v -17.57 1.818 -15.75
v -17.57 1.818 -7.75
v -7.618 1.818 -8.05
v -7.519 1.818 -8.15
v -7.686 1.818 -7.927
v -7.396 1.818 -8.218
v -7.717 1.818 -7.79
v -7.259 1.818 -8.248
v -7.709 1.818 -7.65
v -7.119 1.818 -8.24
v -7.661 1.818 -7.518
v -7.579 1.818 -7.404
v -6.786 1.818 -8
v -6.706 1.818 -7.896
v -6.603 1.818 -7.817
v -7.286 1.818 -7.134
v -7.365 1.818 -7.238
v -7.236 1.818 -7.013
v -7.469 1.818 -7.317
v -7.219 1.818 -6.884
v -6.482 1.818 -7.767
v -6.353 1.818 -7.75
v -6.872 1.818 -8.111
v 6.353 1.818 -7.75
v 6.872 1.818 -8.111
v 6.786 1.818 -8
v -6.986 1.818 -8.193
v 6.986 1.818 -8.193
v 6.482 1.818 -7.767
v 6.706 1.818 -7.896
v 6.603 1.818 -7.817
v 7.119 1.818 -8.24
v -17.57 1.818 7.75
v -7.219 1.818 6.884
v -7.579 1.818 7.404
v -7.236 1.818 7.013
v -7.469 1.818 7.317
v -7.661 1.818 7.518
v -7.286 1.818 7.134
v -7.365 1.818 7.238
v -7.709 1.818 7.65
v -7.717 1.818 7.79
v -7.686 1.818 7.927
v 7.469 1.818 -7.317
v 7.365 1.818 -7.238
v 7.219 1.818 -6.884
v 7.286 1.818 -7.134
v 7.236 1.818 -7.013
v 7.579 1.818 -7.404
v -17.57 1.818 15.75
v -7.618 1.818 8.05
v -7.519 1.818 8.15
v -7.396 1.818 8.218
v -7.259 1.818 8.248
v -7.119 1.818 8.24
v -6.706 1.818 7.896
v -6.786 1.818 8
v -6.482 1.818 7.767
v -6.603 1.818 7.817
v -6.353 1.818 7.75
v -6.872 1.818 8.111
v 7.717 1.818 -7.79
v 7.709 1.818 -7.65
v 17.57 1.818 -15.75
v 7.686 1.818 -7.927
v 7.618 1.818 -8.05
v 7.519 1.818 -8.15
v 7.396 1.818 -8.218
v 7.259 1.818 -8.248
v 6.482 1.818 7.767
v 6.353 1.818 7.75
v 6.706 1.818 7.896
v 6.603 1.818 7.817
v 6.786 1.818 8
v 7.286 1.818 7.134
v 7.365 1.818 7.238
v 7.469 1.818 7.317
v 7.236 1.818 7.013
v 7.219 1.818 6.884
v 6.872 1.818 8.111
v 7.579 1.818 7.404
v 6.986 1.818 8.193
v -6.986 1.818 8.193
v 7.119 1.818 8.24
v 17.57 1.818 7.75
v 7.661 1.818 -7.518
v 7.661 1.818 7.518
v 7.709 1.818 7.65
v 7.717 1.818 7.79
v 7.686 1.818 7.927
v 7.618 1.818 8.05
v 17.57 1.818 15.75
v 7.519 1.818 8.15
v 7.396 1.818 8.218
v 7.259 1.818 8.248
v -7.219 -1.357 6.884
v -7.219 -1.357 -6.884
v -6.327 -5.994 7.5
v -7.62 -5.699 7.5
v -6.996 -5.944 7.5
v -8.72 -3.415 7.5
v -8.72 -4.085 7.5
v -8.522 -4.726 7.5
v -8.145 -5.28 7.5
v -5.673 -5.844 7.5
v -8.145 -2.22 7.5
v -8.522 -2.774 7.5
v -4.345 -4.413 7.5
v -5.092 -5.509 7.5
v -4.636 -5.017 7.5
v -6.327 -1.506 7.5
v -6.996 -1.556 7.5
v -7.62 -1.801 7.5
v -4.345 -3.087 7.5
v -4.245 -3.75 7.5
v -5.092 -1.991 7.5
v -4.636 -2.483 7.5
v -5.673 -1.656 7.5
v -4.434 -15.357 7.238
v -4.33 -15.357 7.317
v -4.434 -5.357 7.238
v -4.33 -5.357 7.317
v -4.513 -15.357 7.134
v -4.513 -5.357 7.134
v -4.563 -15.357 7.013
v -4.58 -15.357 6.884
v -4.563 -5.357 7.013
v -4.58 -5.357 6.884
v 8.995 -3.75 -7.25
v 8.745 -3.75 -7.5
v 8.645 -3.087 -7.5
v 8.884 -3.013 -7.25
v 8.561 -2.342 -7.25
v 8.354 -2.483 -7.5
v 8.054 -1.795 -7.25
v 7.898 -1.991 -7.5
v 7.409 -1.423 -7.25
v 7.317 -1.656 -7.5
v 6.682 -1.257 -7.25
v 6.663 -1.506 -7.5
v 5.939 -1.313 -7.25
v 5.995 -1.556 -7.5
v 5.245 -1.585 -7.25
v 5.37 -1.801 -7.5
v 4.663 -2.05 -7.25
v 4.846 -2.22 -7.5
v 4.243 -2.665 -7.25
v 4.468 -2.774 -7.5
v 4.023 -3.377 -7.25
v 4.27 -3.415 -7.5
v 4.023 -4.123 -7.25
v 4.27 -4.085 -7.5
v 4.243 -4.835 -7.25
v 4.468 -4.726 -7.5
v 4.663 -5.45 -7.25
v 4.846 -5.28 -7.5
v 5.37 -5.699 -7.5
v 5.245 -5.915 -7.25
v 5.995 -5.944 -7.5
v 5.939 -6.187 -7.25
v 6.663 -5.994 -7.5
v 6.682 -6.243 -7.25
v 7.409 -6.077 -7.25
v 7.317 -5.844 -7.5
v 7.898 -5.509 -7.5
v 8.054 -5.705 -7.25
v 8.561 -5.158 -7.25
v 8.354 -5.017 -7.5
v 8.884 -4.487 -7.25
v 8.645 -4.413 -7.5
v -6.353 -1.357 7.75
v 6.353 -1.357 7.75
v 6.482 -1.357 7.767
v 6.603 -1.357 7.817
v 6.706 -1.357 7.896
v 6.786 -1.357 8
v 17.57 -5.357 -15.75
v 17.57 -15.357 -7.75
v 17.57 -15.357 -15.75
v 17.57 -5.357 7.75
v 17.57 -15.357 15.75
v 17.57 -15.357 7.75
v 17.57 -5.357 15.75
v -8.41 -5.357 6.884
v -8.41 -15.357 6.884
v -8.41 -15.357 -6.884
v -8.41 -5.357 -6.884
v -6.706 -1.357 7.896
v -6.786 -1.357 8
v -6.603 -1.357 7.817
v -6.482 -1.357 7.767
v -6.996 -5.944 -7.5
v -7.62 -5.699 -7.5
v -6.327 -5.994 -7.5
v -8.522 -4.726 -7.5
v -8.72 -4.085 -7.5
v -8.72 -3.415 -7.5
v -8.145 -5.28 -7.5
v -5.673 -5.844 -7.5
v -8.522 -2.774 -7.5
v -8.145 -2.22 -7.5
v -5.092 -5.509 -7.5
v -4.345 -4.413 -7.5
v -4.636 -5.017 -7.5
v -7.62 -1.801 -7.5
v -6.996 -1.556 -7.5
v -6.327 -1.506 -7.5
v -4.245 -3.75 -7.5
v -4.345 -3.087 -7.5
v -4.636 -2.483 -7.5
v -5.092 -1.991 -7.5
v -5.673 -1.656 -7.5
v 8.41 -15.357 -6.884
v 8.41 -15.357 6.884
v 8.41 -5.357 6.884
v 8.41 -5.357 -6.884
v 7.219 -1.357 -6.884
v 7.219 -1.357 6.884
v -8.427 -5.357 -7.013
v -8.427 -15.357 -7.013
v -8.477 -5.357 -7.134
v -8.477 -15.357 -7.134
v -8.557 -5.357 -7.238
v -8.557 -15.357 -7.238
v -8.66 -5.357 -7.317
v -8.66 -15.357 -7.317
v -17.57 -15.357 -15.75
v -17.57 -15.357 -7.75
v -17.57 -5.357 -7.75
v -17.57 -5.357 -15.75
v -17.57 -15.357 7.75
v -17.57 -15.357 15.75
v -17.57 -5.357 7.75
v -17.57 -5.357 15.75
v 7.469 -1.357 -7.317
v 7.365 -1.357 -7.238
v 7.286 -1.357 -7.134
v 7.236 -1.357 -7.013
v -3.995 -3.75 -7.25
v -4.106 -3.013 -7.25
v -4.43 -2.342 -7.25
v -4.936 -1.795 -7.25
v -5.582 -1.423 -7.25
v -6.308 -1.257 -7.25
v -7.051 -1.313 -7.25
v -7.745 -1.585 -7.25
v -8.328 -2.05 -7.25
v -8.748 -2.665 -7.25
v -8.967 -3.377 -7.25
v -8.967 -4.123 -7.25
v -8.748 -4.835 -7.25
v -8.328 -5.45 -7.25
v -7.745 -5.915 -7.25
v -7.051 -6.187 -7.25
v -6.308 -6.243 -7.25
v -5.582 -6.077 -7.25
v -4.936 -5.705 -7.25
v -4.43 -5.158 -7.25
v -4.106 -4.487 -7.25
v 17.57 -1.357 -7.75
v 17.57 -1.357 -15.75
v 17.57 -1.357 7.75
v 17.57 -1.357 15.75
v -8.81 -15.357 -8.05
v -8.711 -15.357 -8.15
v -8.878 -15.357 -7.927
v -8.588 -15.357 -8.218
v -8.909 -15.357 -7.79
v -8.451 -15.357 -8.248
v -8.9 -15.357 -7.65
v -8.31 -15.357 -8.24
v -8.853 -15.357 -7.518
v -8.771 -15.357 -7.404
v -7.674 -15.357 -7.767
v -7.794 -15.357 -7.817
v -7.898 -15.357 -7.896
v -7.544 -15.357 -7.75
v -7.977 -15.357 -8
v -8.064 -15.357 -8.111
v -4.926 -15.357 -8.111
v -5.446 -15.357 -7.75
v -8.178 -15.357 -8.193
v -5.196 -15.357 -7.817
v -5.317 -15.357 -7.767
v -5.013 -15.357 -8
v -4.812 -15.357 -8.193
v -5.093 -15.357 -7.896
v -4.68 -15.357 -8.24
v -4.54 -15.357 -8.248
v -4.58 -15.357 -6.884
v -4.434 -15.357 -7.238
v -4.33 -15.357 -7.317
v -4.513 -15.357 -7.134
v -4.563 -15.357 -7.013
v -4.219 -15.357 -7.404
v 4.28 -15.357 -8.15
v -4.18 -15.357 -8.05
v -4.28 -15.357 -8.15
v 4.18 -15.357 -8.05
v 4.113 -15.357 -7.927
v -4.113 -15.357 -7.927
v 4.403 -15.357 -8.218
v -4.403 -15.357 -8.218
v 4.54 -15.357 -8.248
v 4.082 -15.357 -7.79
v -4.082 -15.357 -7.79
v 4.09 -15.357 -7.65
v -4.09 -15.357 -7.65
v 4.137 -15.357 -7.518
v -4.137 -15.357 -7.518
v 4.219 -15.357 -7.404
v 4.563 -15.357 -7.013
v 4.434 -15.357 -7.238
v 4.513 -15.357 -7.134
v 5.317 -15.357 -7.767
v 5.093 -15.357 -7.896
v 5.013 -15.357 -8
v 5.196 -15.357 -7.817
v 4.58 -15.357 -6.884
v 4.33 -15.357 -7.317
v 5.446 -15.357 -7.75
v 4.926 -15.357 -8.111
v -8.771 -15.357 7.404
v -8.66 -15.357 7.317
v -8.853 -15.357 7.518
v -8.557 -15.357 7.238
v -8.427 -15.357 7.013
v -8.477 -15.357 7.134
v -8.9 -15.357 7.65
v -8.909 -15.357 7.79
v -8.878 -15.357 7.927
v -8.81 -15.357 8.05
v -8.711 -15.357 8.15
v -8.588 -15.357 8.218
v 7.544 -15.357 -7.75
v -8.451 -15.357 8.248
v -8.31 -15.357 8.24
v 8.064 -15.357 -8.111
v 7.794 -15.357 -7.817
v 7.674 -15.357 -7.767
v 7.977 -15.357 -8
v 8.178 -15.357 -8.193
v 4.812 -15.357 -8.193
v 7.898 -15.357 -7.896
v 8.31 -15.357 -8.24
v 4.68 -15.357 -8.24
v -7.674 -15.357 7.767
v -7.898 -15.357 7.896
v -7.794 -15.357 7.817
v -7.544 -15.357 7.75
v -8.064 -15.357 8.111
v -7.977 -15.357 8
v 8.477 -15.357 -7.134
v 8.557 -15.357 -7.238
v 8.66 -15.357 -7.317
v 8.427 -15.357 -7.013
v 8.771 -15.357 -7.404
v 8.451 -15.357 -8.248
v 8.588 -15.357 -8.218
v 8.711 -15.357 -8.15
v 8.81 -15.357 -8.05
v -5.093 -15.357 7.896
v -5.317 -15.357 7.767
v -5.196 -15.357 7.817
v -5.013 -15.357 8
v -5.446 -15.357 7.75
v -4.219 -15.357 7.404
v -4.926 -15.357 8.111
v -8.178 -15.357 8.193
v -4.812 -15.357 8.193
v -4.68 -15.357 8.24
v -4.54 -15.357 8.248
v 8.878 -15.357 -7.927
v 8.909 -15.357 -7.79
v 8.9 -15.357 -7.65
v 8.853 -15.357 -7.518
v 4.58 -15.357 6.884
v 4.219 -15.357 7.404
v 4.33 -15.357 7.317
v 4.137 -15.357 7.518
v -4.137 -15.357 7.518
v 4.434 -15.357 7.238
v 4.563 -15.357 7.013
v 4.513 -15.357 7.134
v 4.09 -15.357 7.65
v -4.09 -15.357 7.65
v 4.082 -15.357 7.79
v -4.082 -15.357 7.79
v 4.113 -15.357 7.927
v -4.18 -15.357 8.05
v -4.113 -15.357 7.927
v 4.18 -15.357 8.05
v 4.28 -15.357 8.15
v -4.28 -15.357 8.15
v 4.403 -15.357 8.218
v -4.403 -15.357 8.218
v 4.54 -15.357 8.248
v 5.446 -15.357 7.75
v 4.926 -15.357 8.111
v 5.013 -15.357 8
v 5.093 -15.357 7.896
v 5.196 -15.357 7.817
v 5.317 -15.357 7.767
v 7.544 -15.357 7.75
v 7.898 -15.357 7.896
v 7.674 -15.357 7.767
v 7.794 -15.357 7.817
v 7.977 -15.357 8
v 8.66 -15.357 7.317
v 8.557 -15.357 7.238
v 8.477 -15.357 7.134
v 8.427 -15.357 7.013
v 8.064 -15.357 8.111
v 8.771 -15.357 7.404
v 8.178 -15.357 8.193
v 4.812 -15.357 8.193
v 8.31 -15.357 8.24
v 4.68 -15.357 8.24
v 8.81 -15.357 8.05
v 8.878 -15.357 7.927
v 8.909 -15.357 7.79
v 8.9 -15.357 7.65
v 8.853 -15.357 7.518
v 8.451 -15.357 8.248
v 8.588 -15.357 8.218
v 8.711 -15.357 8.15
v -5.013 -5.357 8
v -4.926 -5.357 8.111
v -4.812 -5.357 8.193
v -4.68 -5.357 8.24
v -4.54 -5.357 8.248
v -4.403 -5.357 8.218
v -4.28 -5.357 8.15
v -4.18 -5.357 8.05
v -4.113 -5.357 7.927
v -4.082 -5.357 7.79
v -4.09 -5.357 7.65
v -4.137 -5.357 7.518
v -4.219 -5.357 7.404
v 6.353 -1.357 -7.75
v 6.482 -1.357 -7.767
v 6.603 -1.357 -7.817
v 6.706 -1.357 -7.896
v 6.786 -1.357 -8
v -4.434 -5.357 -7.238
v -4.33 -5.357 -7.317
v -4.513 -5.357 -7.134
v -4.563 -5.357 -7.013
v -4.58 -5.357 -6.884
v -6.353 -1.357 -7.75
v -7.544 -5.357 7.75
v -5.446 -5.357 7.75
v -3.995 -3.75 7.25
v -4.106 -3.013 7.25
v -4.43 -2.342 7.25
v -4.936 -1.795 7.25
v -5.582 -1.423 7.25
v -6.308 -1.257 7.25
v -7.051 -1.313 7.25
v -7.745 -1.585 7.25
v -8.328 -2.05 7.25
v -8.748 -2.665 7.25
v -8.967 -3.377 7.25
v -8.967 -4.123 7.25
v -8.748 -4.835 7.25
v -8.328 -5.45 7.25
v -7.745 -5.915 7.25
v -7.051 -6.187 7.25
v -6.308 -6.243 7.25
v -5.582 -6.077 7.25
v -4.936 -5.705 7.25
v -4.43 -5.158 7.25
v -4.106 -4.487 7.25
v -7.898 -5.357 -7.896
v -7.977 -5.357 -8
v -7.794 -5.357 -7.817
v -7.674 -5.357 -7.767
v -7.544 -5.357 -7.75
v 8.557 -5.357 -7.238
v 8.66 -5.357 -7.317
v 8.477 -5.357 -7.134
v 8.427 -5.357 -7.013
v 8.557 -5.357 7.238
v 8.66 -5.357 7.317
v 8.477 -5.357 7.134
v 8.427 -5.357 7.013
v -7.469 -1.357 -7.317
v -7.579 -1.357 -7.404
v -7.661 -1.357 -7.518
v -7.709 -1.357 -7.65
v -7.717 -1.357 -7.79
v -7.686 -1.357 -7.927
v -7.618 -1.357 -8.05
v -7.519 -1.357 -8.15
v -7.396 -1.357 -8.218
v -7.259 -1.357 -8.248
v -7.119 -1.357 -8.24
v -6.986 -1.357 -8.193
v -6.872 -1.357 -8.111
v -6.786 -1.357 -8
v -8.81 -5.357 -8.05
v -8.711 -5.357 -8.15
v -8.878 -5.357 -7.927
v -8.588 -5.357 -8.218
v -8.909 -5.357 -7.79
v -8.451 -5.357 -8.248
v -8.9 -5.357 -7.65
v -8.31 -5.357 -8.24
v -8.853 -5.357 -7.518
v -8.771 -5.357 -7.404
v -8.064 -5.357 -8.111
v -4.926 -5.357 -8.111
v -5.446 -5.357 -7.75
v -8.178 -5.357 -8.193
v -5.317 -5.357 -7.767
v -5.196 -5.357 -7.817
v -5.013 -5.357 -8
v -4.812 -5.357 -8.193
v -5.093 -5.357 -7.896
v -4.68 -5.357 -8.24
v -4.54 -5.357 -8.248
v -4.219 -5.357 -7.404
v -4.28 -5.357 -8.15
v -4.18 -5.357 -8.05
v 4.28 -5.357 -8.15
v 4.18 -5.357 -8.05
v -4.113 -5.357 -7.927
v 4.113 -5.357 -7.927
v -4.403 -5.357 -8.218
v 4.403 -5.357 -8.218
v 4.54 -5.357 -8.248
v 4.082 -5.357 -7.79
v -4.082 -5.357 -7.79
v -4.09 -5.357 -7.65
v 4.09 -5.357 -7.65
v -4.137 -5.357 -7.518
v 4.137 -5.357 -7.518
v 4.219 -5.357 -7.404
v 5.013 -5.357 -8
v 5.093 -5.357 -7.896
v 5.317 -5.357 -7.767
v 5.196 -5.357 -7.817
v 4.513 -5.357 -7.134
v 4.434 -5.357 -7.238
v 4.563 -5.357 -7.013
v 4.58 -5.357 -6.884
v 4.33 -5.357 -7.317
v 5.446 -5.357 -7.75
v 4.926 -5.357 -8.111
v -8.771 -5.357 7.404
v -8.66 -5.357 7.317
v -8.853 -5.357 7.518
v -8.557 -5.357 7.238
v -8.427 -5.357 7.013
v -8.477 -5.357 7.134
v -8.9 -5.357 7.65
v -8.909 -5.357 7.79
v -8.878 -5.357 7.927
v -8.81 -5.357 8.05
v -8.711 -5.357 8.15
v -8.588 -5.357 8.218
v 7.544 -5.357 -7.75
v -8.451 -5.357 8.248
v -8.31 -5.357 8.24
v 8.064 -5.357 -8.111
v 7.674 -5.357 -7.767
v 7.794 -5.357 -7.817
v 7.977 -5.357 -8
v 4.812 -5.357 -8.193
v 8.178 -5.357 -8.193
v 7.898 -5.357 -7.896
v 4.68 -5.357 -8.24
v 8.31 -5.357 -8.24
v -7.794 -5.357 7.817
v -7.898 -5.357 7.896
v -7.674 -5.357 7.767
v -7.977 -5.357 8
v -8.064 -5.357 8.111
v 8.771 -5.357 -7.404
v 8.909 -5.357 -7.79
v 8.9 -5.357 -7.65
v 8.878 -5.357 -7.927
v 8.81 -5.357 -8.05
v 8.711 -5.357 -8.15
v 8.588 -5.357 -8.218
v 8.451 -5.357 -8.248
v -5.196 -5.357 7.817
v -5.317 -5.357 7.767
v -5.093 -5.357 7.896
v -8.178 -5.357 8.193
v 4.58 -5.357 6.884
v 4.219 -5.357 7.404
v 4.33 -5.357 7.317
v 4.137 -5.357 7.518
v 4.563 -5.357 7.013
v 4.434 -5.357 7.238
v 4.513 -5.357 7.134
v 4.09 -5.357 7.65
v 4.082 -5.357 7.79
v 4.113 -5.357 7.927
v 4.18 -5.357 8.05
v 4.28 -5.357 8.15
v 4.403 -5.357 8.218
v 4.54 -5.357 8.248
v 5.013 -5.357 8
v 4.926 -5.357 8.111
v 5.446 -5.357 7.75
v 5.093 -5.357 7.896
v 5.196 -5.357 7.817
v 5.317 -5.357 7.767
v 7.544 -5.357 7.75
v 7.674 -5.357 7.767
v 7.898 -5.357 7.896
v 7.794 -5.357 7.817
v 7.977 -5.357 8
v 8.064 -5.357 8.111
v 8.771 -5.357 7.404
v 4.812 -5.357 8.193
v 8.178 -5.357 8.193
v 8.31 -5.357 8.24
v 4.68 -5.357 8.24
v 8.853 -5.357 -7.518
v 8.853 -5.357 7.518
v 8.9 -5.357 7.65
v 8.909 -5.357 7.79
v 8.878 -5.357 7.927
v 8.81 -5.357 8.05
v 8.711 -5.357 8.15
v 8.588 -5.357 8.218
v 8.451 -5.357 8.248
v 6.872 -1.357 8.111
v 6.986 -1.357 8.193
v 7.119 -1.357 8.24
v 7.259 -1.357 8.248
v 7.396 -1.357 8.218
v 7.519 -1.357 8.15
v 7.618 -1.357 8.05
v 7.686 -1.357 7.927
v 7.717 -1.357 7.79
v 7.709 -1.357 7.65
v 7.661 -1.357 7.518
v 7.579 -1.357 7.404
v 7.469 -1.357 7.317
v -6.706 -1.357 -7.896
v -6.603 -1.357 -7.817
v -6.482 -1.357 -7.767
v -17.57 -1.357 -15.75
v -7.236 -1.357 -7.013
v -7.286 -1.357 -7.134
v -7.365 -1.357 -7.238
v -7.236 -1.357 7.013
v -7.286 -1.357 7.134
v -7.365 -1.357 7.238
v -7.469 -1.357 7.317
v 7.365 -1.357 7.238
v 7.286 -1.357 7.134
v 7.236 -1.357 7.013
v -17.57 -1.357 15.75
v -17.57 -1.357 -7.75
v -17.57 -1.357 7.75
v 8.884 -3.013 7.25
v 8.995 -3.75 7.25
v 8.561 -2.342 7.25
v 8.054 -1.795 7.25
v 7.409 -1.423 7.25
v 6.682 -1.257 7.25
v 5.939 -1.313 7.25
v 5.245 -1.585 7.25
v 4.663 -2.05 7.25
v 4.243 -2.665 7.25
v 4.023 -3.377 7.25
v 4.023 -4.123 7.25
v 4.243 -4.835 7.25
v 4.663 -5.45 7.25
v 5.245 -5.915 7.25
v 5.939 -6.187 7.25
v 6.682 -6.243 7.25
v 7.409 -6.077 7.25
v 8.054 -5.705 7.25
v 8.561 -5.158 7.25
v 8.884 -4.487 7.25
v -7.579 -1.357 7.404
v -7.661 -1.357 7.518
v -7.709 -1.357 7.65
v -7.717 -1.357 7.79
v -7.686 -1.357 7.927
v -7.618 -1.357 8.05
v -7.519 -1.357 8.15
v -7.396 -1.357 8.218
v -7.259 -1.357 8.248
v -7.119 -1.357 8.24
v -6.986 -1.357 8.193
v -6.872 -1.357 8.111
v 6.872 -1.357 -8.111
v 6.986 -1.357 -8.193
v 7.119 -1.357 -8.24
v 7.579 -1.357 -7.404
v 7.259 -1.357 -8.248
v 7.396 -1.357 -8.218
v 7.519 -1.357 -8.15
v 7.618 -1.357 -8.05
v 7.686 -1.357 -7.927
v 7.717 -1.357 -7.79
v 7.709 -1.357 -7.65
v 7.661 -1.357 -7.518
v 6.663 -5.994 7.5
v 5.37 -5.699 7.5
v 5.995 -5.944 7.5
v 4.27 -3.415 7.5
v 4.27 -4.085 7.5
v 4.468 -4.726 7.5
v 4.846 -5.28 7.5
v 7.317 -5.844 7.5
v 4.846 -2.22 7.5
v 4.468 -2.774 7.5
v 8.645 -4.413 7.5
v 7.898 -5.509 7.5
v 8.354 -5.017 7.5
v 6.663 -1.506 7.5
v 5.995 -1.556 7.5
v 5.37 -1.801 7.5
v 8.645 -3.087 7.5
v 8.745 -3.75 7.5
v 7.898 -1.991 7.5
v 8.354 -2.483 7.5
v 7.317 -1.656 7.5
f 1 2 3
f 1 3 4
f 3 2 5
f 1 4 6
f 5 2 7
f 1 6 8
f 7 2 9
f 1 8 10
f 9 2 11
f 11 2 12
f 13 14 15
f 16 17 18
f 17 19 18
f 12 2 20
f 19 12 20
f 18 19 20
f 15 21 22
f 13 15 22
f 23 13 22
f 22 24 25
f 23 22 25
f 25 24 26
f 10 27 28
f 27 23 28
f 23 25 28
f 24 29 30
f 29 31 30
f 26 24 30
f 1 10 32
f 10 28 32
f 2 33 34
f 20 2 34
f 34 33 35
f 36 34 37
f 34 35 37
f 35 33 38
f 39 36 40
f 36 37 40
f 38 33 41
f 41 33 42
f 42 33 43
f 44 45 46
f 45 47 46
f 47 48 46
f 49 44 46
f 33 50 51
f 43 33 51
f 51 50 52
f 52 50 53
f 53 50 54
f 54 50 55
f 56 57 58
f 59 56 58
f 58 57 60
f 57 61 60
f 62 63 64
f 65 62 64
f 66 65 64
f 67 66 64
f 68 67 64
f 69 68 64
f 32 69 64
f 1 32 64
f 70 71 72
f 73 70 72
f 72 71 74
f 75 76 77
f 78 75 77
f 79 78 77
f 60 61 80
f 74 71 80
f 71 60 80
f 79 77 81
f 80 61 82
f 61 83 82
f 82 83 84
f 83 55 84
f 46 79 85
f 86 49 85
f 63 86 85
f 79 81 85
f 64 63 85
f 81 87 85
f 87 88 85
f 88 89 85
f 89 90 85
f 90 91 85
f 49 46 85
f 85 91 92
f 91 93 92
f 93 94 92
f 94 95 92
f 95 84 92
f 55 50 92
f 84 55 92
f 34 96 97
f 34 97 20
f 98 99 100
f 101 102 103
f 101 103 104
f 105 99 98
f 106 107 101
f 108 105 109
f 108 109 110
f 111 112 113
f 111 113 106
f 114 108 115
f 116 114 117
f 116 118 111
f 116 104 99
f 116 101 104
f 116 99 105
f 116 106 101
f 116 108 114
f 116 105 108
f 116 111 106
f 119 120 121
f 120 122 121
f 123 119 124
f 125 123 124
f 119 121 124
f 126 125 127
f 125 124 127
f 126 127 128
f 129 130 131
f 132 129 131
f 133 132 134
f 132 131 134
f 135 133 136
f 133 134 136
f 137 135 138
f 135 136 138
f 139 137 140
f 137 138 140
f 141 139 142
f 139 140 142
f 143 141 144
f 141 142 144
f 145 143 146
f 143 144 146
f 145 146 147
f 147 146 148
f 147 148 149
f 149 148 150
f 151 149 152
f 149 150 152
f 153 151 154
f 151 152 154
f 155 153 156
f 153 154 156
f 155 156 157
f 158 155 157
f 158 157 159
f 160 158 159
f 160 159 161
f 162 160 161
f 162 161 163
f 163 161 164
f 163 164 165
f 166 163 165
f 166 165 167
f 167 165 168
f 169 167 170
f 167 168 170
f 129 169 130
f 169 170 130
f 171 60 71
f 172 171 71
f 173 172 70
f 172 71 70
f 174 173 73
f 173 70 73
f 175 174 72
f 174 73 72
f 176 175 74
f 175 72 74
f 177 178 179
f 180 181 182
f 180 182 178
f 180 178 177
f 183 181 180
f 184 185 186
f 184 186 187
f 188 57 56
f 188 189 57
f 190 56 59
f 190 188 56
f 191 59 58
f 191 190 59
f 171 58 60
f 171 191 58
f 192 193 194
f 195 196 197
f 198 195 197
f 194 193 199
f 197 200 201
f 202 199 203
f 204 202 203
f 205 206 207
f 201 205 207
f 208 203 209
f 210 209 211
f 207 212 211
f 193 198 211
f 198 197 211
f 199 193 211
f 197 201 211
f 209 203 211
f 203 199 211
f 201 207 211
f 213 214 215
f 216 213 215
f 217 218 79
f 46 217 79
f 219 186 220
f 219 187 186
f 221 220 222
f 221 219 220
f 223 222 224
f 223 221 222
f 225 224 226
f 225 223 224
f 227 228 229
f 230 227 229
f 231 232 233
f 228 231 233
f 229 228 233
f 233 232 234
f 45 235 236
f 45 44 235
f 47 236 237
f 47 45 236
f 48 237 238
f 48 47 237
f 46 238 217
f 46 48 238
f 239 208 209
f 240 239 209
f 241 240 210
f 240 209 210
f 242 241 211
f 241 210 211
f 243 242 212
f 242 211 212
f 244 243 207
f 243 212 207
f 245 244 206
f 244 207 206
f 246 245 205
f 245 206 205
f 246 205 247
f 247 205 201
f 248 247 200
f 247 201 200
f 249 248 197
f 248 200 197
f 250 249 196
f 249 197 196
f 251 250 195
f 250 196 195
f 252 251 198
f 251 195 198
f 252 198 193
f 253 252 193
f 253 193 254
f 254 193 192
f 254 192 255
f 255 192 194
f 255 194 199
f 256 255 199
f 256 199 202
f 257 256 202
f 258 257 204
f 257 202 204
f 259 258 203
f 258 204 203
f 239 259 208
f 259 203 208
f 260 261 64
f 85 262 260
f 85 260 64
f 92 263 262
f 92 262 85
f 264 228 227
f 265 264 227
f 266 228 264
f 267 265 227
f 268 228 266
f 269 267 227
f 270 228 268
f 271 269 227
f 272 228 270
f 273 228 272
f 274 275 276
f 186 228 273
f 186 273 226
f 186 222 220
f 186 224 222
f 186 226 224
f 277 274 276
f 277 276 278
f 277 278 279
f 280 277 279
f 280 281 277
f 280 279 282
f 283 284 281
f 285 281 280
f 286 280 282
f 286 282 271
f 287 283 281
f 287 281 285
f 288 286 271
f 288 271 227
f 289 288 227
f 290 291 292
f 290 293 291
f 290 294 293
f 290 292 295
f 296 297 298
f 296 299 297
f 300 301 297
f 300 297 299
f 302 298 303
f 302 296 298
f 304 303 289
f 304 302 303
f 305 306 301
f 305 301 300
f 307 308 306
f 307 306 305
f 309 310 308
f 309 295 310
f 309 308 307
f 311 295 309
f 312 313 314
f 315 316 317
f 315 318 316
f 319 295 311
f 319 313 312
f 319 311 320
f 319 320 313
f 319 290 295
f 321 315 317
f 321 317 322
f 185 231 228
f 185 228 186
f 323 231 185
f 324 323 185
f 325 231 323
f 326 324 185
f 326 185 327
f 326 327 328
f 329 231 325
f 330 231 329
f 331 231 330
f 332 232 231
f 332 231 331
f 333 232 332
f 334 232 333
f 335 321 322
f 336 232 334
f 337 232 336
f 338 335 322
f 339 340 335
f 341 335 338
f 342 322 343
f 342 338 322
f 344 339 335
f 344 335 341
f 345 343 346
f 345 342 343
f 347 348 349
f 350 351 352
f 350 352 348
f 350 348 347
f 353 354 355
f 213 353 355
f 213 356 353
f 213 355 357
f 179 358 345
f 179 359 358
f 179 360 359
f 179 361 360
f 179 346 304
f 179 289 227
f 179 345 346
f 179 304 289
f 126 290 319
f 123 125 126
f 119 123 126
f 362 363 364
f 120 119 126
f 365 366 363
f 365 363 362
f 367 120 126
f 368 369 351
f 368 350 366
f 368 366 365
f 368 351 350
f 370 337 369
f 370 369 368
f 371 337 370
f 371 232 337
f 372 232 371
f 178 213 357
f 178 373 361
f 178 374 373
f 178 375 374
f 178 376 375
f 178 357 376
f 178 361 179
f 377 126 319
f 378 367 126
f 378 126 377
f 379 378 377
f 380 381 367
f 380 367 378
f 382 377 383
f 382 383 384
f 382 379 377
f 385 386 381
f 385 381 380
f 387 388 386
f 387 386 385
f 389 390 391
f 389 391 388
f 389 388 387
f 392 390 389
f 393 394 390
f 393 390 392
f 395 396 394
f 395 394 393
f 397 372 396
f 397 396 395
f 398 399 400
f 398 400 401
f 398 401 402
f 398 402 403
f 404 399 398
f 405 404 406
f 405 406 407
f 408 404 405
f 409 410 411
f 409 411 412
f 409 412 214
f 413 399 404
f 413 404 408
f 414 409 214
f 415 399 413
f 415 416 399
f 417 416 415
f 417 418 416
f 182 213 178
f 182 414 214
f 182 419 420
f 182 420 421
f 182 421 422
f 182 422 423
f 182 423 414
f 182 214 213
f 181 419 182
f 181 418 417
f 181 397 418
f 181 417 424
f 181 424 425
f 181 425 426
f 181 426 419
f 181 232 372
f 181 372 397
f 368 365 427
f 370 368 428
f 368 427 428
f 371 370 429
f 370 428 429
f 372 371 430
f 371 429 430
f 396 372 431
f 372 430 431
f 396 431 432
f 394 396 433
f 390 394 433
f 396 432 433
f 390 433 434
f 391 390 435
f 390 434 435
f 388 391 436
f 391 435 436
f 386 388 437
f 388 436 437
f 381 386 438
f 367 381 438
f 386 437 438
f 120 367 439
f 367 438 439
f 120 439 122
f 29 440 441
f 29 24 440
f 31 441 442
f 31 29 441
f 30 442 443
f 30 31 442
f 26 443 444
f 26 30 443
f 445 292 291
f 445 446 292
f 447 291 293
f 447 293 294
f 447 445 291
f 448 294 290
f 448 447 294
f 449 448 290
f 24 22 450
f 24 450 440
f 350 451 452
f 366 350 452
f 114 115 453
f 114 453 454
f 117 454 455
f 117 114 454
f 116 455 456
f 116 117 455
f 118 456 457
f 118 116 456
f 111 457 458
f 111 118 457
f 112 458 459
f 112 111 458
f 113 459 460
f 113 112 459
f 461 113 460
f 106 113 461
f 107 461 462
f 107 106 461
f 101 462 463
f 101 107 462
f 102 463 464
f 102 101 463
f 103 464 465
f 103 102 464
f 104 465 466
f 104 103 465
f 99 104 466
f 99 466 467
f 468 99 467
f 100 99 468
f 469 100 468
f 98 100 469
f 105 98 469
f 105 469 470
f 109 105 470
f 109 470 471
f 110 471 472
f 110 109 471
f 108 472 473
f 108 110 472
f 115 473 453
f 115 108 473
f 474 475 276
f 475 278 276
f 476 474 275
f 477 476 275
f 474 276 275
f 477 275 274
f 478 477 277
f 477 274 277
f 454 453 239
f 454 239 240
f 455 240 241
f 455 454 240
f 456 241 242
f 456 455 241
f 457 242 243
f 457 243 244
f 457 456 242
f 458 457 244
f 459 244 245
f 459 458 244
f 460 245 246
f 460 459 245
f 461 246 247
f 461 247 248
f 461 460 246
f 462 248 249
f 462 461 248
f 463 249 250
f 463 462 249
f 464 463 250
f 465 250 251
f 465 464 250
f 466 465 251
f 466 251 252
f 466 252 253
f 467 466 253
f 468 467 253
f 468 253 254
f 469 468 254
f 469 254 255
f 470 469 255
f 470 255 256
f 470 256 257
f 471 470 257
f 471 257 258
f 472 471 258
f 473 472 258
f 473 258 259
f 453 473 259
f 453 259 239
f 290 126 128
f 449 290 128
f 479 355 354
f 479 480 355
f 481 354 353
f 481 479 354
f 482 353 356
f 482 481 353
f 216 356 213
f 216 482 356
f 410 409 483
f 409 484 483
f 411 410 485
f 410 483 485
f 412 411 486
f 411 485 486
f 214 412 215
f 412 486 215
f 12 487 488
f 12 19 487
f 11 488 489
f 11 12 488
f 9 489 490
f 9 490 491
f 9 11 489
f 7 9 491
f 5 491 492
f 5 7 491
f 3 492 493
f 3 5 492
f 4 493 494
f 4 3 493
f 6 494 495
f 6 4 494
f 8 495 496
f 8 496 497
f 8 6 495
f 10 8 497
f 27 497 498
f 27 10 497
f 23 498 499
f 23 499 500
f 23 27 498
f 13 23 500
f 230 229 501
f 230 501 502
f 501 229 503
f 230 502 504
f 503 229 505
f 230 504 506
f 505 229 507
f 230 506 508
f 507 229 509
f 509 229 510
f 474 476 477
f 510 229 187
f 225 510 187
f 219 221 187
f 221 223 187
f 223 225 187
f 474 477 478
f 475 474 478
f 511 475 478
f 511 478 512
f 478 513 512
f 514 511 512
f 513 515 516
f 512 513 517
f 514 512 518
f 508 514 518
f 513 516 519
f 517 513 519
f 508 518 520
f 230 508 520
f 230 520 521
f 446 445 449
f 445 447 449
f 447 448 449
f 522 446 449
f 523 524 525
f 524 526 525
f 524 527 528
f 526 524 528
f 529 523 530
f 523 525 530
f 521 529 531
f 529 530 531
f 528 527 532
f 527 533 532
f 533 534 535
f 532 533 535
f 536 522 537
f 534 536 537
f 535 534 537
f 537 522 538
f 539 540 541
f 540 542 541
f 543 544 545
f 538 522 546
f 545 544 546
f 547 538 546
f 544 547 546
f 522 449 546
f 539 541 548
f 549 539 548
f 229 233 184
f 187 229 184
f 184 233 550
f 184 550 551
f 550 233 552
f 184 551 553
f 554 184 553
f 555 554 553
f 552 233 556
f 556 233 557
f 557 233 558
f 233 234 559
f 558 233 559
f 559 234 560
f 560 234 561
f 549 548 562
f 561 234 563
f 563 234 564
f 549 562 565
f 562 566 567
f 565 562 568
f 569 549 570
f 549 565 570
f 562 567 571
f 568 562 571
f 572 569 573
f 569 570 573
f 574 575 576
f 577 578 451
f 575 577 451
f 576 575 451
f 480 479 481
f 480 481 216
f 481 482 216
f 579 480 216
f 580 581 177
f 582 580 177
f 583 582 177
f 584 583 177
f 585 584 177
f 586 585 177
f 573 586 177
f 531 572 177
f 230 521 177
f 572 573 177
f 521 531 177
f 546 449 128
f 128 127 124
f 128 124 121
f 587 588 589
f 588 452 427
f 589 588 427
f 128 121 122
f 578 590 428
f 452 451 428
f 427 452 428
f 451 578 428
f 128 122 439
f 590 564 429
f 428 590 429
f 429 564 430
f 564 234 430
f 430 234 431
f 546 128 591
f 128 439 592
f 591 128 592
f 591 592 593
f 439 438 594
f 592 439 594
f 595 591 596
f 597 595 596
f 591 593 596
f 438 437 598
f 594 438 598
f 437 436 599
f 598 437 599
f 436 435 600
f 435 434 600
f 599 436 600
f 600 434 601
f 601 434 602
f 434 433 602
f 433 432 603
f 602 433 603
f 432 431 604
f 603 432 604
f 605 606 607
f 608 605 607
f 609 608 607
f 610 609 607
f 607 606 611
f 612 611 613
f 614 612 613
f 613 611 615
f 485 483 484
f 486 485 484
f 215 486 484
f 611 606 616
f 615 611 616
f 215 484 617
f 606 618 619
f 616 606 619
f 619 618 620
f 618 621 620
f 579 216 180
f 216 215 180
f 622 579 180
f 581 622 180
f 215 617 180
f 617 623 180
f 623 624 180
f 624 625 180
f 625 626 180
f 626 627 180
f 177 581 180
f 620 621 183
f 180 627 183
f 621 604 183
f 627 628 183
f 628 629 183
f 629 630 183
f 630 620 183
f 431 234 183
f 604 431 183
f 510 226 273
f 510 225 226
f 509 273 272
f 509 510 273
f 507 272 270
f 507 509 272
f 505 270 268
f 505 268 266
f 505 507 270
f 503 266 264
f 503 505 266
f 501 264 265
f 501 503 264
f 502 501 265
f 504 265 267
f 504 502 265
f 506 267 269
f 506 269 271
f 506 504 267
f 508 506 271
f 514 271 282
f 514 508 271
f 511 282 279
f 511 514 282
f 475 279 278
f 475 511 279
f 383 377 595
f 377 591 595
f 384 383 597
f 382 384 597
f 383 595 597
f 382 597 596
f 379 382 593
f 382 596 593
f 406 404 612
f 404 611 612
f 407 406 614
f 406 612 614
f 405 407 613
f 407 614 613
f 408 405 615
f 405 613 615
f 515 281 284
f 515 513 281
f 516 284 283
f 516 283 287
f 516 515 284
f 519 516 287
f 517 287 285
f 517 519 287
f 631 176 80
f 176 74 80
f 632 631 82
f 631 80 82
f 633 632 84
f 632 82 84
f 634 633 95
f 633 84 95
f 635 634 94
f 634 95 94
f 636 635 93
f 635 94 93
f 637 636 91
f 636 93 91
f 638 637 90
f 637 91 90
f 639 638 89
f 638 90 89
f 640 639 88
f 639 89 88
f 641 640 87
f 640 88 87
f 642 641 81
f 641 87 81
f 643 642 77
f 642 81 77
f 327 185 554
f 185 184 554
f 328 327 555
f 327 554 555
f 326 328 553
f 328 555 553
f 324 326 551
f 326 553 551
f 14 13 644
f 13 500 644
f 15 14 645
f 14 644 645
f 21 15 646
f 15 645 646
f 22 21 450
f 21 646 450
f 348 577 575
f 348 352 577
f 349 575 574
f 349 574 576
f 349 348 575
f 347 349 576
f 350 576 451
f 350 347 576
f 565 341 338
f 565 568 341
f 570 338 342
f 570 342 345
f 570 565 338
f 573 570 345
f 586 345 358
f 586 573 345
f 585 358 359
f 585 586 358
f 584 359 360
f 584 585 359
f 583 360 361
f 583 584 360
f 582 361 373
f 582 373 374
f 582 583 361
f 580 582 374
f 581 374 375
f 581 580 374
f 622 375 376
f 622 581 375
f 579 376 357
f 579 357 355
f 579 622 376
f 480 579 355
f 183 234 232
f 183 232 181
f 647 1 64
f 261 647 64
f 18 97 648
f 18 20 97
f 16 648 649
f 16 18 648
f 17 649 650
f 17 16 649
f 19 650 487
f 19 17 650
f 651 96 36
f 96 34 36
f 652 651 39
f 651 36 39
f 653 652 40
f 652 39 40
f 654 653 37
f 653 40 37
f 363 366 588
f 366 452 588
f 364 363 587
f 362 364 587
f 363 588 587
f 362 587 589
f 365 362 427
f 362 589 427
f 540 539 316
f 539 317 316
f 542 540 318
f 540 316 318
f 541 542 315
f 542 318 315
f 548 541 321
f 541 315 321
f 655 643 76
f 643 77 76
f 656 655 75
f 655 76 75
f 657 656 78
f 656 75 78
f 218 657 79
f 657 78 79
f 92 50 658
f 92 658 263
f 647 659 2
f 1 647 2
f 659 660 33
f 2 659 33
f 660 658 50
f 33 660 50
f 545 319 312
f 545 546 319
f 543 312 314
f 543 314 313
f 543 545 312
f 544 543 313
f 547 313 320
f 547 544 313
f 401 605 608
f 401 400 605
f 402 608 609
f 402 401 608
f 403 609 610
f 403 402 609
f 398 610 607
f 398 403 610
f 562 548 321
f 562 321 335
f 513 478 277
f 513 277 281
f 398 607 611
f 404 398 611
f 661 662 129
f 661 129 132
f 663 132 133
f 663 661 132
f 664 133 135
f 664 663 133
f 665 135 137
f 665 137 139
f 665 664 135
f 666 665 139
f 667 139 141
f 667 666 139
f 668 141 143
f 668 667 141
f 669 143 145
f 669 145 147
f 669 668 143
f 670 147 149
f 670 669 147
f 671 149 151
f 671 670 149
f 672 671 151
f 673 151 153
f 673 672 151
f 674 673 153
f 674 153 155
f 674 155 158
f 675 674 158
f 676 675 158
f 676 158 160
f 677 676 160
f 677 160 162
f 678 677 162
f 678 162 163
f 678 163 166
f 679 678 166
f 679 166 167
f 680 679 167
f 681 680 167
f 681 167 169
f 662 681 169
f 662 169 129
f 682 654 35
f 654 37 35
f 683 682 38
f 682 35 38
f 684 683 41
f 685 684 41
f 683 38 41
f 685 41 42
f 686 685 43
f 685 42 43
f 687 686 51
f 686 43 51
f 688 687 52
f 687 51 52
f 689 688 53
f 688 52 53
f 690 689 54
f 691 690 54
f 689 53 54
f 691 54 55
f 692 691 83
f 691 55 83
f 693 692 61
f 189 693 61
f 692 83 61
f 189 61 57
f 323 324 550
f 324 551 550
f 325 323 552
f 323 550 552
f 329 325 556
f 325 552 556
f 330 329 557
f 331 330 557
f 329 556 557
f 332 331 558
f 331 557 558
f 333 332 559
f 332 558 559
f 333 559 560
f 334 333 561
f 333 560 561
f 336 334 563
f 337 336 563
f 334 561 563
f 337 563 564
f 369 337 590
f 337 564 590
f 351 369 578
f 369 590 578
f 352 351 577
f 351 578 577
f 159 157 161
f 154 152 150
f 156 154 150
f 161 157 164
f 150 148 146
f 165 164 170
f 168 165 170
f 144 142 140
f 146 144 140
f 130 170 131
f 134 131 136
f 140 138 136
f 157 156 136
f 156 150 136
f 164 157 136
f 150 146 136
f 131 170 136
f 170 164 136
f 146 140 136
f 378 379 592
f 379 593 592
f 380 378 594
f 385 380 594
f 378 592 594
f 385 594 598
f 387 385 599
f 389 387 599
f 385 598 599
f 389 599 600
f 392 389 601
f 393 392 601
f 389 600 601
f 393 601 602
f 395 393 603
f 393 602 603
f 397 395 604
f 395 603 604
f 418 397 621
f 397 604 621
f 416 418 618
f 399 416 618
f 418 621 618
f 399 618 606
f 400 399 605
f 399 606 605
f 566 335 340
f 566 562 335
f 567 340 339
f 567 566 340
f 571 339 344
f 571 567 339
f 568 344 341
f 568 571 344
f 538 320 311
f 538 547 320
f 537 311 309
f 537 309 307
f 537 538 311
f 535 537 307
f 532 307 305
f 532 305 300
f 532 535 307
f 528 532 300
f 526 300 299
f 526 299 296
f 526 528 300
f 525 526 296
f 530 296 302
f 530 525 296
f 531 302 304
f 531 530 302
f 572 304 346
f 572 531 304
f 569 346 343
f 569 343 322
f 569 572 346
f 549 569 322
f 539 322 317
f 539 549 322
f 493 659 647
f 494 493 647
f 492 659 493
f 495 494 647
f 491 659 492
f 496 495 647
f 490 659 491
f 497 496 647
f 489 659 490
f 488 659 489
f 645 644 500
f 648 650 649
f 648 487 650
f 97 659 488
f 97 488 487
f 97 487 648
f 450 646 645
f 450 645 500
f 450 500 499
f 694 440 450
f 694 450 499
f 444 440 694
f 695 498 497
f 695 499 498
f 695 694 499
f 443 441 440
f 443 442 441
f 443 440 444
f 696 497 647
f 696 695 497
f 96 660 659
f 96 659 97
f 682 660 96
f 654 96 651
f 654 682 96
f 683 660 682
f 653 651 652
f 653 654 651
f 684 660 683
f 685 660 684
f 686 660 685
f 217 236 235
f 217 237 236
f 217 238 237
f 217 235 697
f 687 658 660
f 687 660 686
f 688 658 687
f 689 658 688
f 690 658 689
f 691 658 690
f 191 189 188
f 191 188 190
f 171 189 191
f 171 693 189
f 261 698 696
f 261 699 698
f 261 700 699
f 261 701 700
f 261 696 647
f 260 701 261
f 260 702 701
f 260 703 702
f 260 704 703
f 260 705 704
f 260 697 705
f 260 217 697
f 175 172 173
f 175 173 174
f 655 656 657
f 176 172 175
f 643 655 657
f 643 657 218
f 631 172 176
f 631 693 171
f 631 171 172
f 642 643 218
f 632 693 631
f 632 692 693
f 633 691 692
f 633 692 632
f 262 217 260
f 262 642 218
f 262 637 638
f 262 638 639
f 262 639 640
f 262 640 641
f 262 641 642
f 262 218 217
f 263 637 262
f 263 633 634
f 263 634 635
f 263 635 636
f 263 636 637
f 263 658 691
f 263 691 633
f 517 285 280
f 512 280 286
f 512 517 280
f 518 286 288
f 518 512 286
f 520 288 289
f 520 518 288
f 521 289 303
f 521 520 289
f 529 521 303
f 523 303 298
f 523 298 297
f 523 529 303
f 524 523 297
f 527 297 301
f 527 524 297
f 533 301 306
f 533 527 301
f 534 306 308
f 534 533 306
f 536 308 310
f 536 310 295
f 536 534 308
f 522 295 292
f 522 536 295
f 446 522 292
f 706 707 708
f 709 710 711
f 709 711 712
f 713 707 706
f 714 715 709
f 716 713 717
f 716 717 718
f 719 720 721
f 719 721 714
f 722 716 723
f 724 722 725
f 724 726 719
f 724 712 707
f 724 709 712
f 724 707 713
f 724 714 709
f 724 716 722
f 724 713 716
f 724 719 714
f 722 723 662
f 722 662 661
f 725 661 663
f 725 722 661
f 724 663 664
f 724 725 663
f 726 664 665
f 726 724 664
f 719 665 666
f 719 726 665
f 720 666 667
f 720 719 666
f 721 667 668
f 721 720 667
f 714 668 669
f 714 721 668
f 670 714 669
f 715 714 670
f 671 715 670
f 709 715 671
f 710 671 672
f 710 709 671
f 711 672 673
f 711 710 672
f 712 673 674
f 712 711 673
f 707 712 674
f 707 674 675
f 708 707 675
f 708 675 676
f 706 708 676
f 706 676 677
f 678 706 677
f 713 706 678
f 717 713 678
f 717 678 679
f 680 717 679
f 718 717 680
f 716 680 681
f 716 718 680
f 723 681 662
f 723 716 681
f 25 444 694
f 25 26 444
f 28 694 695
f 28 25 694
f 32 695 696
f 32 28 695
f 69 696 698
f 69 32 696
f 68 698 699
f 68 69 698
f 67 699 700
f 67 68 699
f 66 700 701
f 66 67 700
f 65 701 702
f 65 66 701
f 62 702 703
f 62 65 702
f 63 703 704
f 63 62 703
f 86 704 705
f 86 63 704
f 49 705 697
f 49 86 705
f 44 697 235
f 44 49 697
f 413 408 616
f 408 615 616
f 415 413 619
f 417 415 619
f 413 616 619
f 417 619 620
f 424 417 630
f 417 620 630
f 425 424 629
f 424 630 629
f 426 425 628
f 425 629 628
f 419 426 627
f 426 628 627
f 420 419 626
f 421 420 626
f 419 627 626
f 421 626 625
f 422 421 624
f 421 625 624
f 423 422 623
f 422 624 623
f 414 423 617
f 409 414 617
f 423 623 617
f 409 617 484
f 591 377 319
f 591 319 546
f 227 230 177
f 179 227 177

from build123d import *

# Parameters (mm, degrees)
SKETCH1_W             = 9.160158842
SKETCH1_H             = 10
BOSS_EXTRUDE1_DEPTH   = 7.75
SKETCH1_W_2           = 9.160158841
BOSS_EXTRUDE1_2_DEPTH = 7.75
BOSS_EXTRUDE1_3_DEPTH = 7.75
SKETCH1_W_3           = 10.351804159
SKETCH1_H_2           = 3.175
BOSS_EXTRUDE1_4_DEPTH = 7.75
BOSS_EXTRUDE1_5_DEPTH = 7.75
SKETCH2_W             = 35.140920954
SKETCH2_H             = 10
SKETCH2_H_2           = 3.175
BOSS_EXTRUDE2_DEPTH   = 8
SKETCH3_R             = 0.5
CUT_EXTRUDE1_DEPTH    = 26.627789241
SKETCH4_R             = 0.5
CUT_EXTRUDE2_DEPTH    = 3.175
FILLET1_R             = 0.5
FILLET2_R             = 0.5
SKETCH1_3_R           = 2.5
BOSS_EXTRUDE3_DEPTH   = 7.5
BOSS_EXTRUDE3_2_DEPTH = 7.5
CHAMFER1_SIZE         = 0.25
CHAMFER2_SIZE         = 0.25


with BuildPart() as part:
    # Sketch1 → Boss-Extrude1 (new body)
    with BuildSketch(Plane.XY):
        with Locations((0, -10.356969024)):
            Rectangle(SKETCH1_W, SKETCH1_H)
    extrude(amount=BOSS_EXTRUDE1_DEPTH)



with BuildPart() as body_2:
    # Sketch1 → Boss-Extrude1 2 (new body)
    with BuildSketch(Plane.XY):
        with Locations((12.990381057, -10.356969024)):
            Rectangle(SKETCH1_W_2, SKETCH1_H)
    extrude(amount=BOSS_EXTRUDE1_2_DEPTH)


with BuildPart() as body_3:
    # Sketch1 → Boss-Extrude1 3 (new body)
    with BuildSketch(Plane.XY):
        with Locations((-12.990381057, -10.356969024)):
            Rectangle(SKETCH1_W_2, SKETCH1_H)
    extrude(amount=BOSS_EXTRUDE1_3_DEPTH)


with BuildPart() as body_4:
    # Sketch1 → Boss-Extrude1 4 (new body)
    with BuildSketch(Plane.XY):
        with Locations((-12.394558398, 0.230530976)):
            Rectangle(SKETCH1_W_3, SKETCH1_H_2)
    extrude(amount=BOSS_EXTRUDE1_4_DEPTH)


with BuildPart() as body_5:
    # Sketch1 → Boss-Extrude1 5 (new body)
    with BuildSketch(Plane.XY):
        with Locations((12.394558398, 0.230530976)):
            Rectangle(SKETCH1_W_3, SKETCH1_H_2)
    extrude(amount=BOSS_EXTRUDE1_5_DEPTH)


with BuildPart() as part_1:
    add(part.part)

    add(body_2.part)  # Boss-Extrude2 merges body 2

    add(body_3.part)  # Boss-Extrude2 merges body 3

    add(body_4.part)  # Boss-Extrude2 merges body 4

    add(body_5.part)  # Boss-Extrude2 merges body 5
    # Sketch2 → Boss-Extrude2 (add)
    with BuildSketch(Plane.XY.offset(7.75)):
        with Locations((0, -10.356969024)):
            Rectangle(SKETCH2_W, SKETCH2_H)
        with Locations((0, 0.230530976)):
            Rectangle(SKETCH2_W, SKETCH2_H_2)
    extrude(amount=BOSS_EXTRUDE2_DEPTH)

    # Sketch3 → Cut-Extrude1 (cut, through all)
    with BuildSketch(Plane(origin=(0, -5.356969024, 0), x_dir=(1, 0, 0), z_dir=(0, 1, 0))):
        with Locations((-8.410301636, -7.75)):
            Circle(SKETCH3_R)
        with Locations((-4.580079421, -7.75)):
            Circle(SKETCH3_R)
        with Locations((4.580079421, -7.75)):
            Circle(SKETCH3_R)
        with Locations((8.410301636, -7.75)):
            Circle(SKETCH3_R)
    extrude(amount=-CUT_EXTRUDE1_DEPTH, mode=Mode.SUBTRACT)

    # Sketch4 → Cut-Extrude2 (cut)
    with BuildSketch(Plane(origin=(0, 1.818030976, 0), x_dir=(1, 0, 0), z_dir=(0, 1, 0))):
        with Locations((-7.218656318, -7.75)):
            Circle(SKETCH4_R)
        with Locations((7.218656318, -7.75)):
            Circle(SKETCH4_R)
    extrude(amount=-CUT_EXTRUDE2_DEPTH, mode=Mode.SUBTRACT)

    # Fillet1
    fillet1_edges = [part_1.edges().sort_by_distance(p)[0] for p in [
        (-7.910301636, -10.356969024, 7.75),
        (-4.580079421, -10.356969024, 7.25),
        (5.080079421, -10.356969024, 7.75),
        (4.580079421, -10.356969024, 7.25),
        (7.910301636, -10.356969024, 7.75),
        (-8.410301636, -10.356969024, 7.25),
        (8.410301636, -10.356969024, 7.25),
        (-5.080079421, -10.356969024, 7.75),
    ]]
    fillet(fillet1_edges, radius=FILLET1_R)

    # Fillet2
    fillet2_edges = [part_1.edges().sort_by_distance(p)[0] for p in [
        (7.218656318, 0.230530976, 7.25),
        (-7.218656318, 0.230530976, 7.25),
        (-6.718656318, 0.230530976, 7.75),
        (6.718656318, 0.230530976, 7.75),
    ]]
    fillet(fillet2_edges, radius=FILLET2_R)

    # Mirror1: part across plane


with BuildPart() as part_2:
    add(part_1.part)
    add(part_1.part.mirror(Plane(origin=(0, 0, 0), x_dir=(1, 0, 0), z_dir=(0, 0, -1))))


with BuildPart() as body_2_2:
    # Sketch1<3> → Boss-Extrude3 (new, symmetric)
    with BuildSketch(Plane.XY):
        with Locations((6.495190528, -3.75)):
            Circle(SKETCH1_3_R)
    extrude(amount=BOSS_EXTRUDE3_DEPTH, both=True)

    # Chamfer2
    chamfer2_edges = [body_2_2.edges().sort_by_distance(p)[0] for p in [
        (3.995190528, -3.75, -7.5),
        (3.995190528, -3.75, 7.5),
    ]]
    chamfer(chamfer2_edges, length=CHAMFER2_SIZE)


with BuildPart() as body_3_2:
    # Sketch1<3> → Boss-Extrude3 2 (new, symmetric)
    with BuildSketch(Plane.XY):
        with Locations((-6.495190528, -3.75)):
            Circle(SKETCH1_3_R)
    extrude(amount=BOSS_EXTRUDE3_2_DEPTH, both=True)

    # Chamfer1
    chamfer1_edges = [body_3_2.edges().sort_by_distance(p)[0] for p in [
        (-8.995190528, -3.75, -7.5),
        (-8.995190528, -3.75, 7.5),
    ]]
    chamfer(chamfer1_edges, length=CHAMFER1_SIZE)


solid = Compound([part_2.part, body_2_2.part, body_3_2.part])
